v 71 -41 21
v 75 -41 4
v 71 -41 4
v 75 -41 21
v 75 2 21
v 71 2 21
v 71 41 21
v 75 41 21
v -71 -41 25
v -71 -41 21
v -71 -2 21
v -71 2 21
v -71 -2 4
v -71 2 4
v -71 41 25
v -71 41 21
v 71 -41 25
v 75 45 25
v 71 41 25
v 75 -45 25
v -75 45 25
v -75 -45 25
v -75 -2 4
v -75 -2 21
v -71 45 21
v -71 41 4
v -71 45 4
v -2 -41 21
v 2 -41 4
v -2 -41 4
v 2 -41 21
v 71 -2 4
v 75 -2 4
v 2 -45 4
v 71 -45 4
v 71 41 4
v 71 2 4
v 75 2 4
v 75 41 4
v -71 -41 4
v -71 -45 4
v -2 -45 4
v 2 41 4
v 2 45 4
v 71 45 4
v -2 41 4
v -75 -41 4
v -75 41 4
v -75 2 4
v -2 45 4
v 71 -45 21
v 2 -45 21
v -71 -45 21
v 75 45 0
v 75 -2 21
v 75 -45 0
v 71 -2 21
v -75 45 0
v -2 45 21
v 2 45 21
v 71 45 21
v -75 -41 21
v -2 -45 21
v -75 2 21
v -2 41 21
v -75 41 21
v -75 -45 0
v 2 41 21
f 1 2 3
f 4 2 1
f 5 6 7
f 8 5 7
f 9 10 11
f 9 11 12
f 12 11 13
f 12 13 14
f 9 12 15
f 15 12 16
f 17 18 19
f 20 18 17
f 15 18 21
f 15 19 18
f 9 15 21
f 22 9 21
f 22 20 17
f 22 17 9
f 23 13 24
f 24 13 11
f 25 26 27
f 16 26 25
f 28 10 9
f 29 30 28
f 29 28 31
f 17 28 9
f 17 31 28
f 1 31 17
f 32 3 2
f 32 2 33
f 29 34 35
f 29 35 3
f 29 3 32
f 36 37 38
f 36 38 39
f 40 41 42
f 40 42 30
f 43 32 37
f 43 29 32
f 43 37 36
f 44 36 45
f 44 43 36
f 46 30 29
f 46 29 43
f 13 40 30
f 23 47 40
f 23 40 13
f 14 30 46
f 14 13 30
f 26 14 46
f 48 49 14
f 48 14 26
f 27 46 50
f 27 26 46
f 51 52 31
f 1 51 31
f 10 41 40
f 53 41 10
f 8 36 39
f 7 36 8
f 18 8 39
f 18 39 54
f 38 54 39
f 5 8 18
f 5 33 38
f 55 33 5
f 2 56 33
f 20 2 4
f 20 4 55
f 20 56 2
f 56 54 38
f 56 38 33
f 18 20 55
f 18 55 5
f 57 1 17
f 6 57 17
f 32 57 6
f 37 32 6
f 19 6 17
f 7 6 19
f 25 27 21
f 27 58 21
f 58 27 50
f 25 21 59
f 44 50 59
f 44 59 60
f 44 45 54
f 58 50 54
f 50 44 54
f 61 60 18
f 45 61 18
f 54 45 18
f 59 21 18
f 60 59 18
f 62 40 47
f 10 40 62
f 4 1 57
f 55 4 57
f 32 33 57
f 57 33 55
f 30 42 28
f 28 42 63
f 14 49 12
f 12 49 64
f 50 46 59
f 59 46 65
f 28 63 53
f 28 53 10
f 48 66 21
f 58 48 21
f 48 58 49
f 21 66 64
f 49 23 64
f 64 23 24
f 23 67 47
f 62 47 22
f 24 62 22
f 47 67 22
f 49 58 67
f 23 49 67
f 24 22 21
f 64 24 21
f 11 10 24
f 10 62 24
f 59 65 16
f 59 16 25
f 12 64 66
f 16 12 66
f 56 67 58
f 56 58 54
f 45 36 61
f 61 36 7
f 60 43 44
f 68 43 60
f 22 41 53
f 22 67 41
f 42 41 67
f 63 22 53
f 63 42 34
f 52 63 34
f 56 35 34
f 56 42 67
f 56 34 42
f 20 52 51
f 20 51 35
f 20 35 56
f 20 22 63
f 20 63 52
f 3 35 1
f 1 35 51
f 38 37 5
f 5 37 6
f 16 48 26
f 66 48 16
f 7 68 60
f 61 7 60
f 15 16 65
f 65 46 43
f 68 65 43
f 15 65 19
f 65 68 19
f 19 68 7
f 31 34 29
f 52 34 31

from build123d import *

# Parameters (mm, degrees)
F0_W     = 75
F0_H     = 25
F0_W_2   = 69
F0_H_2   = 17
F1_DEPTH = 45
F2_W     = 39
F2_H     = 17
F3_DEPTH = 100
F5_START = 4
F4_W     = 142
F4_H     = 82
F5_DEPTH = 26


with BuildPart() as f1:
    # F0 (on Front) → F1 (new body, symmetric)
    with BuildSketch(Plane.XZ):
        with Locations((-37.5, 12.5)):
            Rectangle(F0_W, F0_H)
        with Locations((-36.5, 12.5)):
            Rectangle(F0_W_2, F0_H_2, mode=Mode.SUBTRACT)
        with Locations((37.5, 12.5)):
            Rectangle(F0_W, F0_H)
        with Locations((36.5, 12.5)):
            Rectangle(F0_W_2, F0_H_2, mode=Mode.SUBTRACT)
    extrude(amount=F1_DEPTH, both=True)

    # F2 (on Right) → F3 (cut, symmetric)
    with BuildSketch(Plane.YZ):
        with Locations((21.5, 12.5)):
            Rectangle(F2_W, F2_H)
        with Locations((-21.5, 12.5)):
            Rectangle(F2_W, F2_H)
    extrude(amount=F3_DEPTH, both=True, mode=Mode.SUBTRACT)

    # F4 (on Top) → F5 (cut)
    with BuildSketch(Plane.XY.offset(F5_START)):
        Rectangle(F4_W, F4_H)
    extrude(amount=F5_DEPTH, mode=Mode.SUBTRACT)


solid = f1.part
